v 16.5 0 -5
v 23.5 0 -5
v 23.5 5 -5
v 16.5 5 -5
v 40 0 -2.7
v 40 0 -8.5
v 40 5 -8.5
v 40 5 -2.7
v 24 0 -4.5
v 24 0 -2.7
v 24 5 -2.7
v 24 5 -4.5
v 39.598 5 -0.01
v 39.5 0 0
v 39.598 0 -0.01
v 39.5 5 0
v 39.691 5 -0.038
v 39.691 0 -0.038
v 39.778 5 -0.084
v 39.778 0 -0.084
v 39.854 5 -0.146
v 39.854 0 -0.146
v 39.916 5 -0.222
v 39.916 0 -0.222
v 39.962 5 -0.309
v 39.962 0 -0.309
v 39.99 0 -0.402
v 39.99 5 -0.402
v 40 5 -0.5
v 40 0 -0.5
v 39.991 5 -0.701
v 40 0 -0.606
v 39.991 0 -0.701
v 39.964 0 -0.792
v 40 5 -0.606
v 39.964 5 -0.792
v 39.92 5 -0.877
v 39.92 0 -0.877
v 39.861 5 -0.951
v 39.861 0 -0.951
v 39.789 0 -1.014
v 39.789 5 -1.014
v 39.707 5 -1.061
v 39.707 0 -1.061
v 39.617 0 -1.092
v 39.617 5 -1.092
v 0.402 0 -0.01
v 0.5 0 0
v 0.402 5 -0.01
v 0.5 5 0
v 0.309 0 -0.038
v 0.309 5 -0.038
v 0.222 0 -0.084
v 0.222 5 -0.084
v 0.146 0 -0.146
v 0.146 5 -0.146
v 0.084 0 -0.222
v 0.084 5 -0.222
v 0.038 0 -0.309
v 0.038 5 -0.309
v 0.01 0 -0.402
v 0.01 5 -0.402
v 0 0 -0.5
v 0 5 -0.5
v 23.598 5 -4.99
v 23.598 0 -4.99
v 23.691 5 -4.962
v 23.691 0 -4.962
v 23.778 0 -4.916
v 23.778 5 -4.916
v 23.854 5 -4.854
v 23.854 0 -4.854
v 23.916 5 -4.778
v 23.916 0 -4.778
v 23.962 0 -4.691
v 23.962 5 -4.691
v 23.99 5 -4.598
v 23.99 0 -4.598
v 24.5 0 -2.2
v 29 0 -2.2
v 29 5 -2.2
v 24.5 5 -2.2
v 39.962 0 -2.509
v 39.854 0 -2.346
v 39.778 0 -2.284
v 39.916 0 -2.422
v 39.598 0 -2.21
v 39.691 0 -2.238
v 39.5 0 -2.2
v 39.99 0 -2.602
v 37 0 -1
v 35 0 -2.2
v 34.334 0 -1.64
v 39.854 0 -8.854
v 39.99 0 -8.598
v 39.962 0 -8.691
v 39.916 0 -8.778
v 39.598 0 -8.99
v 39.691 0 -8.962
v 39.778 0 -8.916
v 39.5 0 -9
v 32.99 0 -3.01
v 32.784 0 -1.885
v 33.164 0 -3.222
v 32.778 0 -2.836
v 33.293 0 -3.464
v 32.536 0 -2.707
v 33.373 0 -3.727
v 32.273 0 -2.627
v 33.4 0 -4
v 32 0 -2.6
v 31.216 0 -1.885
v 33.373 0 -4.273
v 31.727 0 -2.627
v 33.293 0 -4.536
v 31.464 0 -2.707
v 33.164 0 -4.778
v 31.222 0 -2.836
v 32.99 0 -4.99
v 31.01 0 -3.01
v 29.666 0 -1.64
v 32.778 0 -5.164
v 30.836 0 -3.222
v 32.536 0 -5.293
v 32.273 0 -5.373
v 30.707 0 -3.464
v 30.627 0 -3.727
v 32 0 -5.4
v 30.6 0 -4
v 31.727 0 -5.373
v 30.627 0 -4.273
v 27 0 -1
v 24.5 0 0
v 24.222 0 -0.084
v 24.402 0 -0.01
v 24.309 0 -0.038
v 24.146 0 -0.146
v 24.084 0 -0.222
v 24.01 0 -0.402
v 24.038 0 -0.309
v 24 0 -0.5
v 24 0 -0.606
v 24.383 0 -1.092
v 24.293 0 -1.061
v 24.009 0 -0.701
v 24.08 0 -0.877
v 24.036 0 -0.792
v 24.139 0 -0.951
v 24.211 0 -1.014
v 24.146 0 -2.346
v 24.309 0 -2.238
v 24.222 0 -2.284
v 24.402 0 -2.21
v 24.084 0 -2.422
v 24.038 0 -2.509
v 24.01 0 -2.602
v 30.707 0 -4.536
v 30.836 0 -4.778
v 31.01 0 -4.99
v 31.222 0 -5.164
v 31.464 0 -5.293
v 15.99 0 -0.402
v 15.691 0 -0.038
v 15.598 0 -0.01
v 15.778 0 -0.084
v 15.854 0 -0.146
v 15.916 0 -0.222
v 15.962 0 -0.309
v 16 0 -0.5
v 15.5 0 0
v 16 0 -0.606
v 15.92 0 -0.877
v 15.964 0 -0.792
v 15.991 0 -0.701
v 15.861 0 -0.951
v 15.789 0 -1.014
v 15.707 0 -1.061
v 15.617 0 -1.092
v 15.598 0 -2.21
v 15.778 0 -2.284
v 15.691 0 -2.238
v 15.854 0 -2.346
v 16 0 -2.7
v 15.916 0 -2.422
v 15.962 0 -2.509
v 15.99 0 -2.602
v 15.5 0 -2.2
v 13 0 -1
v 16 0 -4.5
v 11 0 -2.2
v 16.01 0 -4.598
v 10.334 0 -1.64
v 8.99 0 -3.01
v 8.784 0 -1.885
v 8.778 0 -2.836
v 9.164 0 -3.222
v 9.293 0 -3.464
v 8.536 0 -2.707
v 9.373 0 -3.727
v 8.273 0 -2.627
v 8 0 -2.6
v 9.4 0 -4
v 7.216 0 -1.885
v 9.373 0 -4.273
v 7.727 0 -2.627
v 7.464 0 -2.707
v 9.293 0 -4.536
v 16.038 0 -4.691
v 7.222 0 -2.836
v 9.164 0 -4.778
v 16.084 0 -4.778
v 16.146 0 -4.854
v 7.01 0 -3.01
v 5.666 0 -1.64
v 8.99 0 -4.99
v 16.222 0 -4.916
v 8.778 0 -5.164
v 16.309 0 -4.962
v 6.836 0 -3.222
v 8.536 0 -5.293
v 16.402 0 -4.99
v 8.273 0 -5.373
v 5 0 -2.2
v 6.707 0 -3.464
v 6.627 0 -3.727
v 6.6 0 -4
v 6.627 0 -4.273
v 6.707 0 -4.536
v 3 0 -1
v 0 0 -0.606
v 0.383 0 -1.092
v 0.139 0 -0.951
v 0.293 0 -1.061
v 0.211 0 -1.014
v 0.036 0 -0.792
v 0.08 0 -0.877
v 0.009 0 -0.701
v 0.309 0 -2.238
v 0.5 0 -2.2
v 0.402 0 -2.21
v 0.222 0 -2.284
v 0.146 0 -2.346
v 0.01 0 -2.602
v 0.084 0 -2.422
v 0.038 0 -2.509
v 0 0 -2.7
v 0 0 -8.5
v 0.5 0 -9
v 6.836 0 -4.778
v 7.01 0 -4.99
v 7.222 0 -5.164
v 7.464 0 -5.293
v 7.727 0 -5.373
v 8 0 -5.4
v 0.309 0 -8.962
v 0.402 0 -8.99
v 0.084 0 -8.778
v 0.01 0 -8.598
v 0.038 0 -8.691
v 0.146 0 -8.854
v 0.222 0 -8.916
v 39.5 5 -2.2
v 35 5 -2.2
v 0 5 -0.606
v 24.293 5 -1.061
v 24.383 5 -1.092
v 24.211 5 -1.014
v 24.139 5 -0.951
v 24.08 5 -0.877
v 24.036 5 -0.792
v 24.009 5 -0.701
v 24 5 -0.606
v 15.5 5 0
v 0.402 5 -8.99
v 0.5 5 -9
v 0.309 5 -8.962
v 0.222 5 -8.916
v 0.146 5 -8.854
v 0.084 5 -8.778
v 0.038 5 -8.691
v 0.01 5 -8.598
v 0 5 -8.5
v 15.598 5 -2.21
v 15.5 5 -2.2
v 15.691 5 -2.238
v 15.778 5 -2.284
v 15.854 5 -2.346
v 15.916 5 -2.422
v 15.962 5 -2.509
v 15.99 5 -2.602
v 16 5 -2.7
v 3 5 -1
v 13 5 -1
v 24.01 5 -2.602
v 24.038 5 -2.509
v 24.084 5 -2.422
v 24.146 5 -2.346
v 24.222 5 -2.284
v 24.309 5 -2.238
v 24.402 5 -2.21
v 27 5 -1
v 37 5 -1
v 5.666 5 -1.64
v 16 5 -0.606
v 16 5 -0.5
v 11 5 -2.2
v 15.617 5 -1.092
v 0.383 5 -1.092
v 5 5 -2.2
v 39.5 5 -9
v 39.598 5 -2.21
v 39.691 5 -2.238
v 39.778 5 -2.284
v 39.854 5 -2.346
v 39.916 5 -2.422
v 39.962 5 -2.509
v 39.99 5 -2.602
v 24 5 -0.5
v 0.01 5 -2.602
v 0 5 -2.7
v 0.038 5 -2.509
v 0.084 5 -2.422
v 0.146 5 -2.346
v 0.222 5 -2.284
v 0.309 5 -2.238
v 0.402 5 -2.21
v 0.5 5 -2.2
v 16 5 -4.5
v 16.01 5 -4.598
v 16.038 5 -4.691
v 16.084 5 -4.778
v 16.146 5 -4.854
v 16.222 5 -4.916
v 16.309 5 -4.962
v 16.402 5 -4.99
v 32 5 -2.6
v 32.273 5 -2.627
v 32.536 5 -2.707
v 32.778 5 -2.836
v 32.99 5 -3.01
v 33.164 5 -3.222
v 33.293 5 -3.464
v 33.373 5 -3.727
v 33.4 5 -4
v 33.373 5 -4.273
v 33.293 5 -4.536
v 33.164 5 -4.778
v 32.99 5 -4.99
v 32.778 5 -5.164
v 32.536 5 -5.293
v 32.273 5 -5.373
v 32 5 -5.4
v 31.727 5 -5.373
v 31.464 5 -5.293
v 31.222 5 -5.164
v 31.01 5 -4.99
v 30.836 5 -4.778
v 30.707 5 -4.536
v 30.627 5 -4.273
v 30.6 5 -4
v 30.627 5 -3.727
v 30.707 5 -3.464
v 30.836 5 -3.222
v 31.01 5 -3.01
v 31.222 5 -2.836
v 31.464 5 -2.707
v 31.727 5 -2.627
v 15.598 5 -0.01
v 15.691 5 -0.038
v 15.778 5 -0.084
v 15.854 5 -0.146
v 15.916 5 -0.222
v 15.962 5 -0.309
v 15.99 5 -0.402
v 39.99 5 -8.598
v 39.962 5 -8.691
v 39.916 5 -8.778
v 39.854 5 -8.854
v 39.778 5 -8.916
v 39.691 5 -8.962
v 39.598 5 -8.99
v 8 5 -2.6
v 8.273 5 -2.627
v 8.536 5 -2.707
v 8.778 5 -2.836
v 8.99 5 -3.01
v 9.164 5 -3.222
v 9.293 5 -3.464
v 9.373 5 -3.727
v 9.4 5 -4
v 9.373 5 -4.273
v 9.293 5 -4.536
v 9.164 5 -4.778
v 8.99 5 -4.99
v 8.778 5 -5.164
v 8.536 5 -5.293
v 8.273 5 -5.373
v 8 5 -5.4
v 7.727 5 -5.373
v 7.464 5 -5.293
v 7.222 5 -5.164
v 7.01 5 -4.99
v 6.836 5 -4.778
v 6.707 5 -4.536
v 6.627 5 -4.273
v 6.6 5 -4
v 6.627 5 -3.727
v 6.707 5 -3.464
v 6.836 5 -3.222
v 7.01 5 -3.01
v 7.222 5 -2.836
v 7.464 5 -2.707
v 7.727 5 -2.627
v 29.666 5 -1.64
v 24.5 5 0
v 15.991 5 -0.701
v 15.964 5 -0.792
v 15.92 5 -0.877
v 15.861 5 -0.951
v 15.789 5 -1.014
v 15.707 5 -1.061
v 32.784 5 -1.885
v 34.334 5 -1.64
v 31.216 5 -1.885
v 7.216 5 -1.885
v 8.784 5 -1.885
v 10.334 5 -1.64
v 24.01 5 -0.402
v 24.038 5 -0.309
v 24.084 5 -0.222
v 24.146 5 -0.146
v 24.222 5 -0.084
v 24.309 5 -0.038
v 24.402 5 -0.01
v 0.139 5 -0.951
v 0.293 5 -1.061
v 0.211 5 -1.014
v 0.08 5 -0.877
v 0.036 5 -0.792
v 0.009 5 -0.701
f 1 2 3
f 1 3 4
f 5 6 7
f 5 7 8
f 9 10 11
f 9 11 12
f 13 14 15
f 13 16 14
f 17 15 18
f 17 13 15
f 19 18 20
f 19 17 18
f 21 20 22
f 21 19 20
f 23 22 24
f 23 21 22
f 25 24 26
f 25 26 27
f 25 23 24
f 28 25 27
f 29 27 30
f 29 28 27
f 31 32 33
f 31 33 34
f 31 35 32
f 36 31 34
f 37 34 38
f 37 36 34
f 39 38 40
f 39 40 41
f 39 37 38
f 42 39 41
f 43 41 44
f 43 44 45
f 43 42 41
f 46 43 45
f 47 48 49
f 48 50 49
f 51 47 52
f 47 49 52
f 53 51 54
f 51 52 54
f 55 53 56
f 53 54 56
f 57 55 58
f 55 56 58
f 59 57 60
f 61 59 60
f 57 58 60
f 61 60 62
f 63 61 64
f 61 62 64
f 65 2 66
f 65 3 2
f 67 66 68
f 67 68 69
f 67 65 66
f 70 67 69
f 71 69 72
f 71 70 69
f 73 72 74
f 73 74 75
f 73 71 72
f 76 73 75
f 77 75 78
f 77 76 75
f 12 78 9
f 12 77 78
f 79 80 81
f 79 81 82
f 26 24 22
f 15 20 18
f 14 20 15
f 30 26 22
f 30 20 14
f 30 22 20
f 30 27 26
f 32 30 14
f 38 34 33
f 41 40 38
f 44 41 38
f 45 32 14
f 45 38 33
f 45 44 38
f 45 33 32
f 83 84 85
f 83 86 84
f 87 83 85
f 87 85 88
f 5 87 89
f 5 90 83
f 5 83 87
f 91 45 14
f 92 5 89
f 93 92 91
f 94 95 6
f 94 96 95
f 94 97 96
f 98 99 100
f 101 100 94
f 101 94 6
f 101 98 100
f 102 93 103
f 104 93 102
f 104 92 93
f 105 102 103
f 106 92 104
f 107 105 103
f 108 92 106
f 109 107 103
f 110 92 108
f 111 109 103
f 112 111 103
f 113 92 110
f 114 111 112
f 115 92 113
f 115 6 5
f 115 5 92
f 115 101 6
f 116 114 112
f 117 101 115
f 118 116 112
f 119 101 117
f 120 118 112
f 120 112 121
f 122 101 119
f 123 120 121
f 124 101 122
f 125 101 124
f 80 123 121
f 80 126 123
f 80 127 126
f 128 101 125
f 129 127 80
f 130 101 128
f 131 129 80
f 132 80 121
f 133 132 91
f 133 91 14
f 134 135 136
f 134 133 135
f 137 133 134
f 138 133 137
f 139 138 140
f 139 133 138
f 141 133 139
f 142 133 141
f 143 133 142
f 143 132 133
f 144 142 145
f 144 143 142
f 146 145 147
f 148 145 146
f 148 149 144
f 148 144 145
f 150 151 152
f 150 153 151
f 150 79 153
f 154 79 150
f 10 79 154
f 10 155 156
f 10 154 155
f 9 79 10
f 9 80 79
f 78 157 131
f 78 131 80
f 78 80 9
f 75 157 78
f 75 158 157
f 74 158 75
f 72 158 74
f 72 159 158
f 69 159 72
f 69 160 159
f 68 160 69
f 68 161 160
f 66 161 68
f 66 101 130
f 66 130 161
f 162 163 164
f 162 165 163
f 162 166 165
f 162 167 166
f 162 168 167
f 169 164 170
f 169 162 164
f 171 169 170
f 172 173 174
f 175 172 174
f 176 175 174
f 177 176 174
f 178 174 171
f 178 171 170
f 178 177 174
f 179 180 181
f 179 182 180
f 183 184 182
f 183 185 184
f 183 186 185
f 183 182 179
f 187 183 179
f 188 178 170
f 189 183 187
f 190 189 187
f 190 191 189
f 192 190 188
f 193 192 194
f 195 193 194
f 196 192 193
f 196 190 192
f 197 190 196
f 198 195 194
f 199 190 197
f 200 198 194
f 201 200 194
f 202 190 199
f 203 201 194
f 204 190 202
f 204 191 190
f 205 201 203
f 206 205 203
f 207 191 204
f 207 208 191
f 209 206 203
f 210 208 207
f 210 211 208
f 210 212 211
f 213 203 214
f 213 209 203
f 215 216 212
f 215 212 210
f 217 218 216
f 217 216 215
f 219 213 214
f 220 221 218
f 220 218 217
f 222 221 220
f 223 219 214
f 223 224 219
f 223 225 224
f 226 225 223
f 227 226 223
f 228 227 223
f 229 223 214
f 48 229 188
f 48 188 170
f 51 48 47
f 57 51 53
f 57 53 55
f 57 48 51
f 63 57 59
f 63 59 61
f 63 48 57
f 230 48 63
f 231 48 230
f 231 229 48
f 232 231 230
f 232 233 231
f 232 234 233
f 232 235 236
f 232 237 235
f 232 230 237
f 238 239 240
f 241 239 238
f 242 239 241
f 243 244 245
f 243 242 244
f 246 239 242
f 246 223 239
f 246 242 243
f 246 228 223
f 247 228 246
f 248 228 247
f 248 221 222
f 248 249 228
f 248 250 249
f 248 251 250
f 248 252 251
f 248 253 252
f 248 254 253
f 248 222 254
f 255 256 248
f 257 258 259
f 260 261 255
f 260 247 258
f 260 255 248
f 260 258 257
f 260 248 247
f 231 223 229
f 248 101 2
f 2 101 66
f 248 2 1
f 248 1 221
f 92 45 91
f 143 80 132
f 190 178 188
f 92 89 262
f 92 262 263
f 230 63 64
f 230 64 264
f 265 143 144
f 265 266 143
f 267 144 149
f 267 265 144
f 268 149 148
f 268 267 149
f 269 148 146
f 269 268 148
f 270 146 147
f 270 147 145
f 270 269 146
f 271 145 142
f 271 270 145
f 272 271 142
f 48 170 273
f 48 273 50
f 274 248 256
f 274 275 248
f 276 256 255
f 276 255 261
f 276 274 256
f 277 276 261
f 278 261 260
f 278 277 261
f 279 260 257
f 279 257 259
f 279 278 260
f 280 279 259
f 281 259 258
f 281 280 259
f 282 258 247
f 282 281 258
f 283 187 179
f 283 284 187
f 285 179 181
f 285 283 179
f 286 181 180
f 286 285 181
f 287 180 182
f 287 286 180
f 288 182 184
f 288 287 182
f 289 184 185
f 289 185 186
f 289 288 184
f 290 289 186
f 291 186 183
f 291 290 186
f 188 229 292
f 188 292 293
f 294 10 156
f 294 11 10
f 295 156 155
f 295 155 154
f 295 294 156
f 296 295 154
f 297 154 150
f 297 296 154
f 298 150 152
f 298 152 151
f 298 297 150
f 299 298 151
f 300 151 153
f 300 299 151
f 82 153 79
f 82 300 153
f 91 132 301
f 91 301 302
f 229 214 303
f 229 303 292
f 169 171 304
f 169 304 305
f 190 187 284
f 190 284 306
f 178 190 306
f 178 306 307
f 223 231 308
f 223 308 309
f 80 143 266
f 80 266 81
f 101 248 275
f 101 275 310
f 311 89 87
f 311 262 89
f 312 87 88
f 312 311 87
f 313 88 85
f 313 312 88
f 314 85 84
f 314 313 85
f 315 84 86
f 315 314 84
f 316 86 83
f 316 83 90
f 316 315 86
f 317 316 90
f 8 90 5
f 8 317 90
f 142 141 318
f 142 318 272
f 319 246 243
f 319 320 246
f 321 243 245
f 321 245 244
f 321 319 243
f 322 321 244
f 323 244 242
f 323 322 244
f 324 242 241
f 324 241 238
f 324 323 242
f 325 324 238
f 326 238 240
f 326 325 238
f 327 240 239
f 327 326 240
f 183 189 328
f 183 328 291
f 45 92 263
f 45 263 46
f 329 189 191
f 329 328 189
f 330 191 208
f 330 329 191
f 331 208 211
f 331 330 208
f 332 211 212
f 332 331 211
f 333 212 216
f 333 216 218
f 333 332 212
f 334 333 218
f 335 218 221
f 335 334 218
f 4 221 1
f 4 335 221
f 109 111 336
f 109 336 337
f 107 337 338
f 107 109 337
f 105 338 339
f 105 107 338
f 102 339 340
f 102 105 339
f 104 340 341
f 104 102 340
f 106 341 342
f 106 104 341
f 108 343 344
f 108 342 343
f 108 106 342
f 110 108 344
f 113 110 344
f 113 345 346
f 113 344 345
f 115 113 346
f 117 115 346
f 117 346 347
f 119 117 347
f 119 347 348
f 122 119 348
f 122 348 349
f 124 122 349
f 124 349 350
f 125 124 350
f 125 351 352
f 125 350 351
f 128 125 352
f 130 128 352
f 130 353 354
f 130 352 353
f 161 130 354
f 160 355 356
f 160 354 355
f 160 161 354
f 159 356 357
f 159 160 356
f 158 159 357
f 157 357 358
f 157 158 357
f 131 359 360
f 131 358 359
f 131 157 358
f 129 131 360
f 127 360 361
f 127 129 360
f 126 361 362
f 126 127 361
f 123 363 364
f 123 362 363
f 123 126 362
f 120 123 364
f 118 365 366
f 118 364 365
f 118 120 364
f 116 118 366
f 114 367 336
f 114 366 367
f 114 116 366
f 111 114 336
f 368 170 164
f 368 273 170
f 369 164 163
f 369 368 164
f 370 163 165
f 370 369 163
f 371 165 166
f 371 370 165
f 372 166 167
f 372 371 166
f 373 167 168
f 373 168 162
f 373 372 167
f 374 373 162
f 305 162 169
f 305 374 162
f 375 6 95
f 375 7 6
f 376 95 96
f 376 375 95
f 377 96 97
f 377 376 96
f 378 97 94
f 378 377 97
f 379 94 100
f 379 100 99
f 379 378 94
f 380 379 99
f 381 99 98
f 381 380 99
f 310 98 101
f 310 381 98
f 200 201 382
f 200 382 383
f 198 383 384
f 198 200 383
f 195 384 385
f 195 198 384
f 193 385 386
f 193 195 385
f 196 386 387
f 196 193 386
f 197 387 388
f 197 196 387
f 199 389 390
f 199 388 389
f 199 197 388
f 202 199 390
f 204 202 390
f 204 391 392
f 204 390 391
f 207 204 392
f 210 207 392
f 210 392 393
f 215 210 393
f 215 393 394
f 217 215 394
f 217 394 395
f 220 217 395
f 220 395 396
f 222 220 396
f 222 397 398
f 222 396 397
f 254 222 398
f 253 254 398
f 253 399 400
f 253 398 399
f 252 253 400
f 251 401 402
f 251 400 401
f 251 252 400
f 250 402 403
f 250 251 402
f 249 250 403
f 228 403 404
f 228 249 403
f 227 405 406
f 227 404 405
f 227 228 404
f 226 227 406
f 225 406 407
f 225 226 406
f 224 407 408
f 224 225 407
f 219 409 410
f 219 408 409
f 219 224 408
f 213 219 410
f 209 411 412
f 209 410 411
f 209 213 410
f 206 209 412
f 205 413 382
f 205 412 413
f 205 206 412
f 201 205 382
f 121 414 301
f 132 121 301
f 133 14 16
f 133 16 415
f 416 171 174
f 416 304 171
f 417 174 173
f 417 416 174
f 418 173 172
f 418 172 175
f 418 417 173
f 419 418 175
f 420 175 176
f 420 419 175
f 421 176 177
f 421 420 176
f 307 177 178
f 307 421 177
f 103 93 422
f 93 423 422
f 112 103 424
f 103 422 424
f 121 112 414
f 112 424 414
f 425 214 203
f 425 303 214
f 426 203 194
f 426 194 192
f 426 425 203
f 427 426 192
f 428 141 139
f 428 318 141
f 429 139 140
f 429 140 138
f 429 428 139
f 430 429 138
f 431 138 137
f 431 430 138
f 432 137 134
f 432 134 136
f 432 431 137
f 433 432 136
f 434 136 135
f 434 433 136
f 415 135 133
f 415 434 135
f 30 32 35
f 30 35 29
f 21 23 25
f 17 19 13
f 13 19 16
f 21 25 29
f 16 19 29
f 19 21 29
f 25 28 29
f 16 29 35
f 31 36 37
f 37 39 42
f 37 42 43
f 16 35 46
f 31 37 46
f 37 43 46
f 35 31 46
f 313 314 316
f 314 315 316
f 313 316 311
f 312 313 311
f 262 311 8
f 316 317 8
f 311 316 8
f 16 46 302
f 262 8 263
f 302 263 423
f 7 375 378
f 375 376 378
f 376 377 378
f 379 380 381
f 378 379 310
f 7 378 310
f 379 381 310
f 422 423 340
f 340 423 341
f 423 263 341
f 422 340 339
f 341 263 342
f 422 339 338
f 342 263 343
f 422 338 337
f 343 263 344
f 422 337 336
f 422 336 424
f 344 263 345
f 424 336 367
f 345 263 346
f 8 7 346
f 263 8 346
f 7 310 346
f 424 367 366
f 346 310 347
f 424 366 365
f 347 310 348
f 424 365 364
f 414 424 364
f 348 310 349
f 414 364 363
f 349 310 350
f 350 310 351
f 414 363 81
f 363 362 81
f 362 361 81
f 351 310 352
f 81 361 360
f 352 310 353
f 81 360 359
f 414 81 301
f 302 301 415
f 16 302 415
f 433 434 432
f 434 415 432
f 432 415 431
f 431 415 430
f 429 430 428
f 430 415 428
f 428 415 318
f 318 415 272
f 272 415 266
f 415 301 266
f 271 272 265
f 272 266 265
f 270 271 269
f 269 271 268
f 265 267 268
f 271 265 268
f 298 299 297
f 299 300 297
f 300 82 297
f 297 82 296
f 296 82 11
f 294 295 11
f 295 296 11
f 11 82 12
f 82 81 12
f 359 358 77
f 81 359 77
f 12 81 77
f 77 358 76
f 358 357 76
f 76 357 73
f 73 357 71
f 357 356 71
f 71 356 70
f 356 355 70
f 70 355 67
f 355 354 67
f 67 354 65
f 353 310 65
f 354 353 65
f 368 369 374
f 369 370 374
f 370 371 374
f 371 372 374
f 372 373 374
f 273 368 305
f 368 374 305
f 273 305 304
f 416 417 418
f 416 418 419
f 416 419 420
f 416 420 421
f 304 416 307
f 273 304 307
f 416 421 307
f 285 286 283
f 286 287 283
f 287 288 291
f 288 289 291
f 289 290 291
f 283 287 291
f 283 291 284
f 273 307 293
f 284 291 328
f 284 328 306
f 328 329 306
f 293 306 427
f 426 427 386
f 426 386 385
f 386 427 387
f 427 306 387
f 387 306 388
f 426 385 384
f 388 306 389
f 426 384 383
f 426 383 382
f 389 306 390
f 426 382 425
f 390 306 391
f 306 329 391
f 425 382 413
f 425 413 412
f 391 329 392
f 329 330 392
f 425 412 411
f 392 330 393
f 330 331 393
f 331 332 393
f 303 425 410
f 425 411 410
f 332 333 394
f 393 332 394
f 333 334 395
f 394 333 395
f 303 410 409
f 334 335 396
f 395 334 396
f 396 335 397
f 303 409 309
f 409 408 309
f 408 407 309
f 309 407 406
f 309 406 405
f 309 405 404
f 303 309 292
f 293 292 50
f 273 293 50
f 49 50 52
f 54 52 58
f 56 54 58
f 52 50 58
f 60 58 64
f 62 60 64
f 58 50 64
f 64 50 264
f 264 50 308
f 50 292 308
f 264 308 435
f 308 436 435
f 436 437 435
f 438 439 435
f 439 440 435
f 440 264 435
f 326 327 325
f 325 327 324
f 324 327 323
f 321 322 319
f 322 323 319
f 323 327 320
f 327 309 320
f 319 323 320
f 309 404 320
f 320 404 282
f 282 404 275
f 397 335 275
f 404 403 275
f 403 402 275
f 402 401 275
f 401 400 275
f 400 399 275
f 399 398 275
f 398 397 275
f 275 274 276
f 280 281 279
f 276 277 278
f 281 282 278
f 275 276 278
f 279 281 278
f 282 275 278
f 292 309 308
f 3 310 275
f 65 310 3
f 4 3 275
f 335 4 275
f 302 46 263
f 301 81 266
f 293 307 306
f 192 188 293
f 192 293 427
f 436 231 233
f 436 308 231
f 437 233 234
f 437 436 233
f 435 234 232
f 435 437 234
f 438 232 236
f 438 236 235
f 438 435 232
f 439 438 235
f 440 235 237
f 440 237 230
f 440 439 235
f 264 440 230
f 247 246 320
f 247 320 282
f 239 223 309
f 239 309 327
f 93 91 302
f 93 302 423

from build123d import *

# Parameters (mm, degrees)
BOSS_EXTRUDE1_DEPTH     = 5
CUT_EXTRUDE1_DEPTH      = 5
CUT_EXTRUDE1_DEPTH_BACK = 10
SKETCH2_R               = 1.4
FILLET1_R               = 10
FILLET2_R               = 0.5


with BuildPart() as part:
    # Sketch1 → Boss-Extrude1 (new body)
    with BuildSketch(Plane(origin=(0, 0, 0), x_dir=(1, 0, 0), z_dir=(0, 1, 0))):
        Polygon((0, 0), (0, 9), (40, 9), (40, 0), (24, 0), (24, 5), (16, 5), (16, 0), align=None)
    extrude(amount=BOSS_EXTRUDE1_DEPTH)

    # Sketch2 → Cut-Extrude1 (cut, two sides: drawn at the far end of the back side and taken through both)
    with BuildSketch(Plane(origin=(0, 5, 0), x_dir=(1, 0, 0), z_dir=(0, 1, 0)).offset(-CUT_EXTRUDE1_DEPTH_BACK)):
        with Locations(Location((8, 4, 0), (0, 0, 270))):
            Circle(SKETCH2_R)
        with Locations(Location((32, 4, 0), (0, 0, 270))):
            Circle(SKETCH2_R)
        Polygon((5, 2.2), (0, 2.2), (0, 1), align=None)
        Polygon((13, 1), (8, 2.2), (3, 1), align=None)
        Polygon((16, 2.2), (11, 2.2), (16, 1), align=None)
        Polygon((24, 2.2), (24, 1), (29, 2.2), align=None)
        Polygon((32, 2.2), (27, 1), (37, 1), align=None)
        Polygon((40, 2.2), (35, 2.2), (40, 1), align=None)
    extrude(amount=CUT_EXTRUDE1_DEPTH + CUT_EXTRUDE1_DEPTH_BACK, mode=Mode.SUBTRACT)

    # Fillet1
    fillet1_edges = [part.edges().sort_by_distance(p)[0] for p in [
        (32, 2.5, -2.2),
        (8, 2.5, -2.2),
    ]]
    fillet(fillet1_edges, radius=FILLET1_R)

    # Fillet2
    fillet2_edges = [part.edges().sort_by_distance(p)[0] for p in [
        (0, 2.5, 0),
        (0, 2.5, -9),
        (40, 2.5, -9),
        (40, 2.5, 0),
        (24, 2.5, 0),
        (24, 2.5, -5),
        (16, 2.5, -5),
        (16, 2.5, 0),
        (0, 2.5, -1),
        (0, 2.5, -2.2),
        (16, 2.5, -2.2),
        (16, 2.5, -1),
        (24, 2.5, -2.2),
        (24, 2.5, -1),
        (40, 2.5, -2.2),
        (40, 2.5, -1),
    ]]
    fillet(fillet2_edges, radius=FILLET2_R)


solid = part.part
